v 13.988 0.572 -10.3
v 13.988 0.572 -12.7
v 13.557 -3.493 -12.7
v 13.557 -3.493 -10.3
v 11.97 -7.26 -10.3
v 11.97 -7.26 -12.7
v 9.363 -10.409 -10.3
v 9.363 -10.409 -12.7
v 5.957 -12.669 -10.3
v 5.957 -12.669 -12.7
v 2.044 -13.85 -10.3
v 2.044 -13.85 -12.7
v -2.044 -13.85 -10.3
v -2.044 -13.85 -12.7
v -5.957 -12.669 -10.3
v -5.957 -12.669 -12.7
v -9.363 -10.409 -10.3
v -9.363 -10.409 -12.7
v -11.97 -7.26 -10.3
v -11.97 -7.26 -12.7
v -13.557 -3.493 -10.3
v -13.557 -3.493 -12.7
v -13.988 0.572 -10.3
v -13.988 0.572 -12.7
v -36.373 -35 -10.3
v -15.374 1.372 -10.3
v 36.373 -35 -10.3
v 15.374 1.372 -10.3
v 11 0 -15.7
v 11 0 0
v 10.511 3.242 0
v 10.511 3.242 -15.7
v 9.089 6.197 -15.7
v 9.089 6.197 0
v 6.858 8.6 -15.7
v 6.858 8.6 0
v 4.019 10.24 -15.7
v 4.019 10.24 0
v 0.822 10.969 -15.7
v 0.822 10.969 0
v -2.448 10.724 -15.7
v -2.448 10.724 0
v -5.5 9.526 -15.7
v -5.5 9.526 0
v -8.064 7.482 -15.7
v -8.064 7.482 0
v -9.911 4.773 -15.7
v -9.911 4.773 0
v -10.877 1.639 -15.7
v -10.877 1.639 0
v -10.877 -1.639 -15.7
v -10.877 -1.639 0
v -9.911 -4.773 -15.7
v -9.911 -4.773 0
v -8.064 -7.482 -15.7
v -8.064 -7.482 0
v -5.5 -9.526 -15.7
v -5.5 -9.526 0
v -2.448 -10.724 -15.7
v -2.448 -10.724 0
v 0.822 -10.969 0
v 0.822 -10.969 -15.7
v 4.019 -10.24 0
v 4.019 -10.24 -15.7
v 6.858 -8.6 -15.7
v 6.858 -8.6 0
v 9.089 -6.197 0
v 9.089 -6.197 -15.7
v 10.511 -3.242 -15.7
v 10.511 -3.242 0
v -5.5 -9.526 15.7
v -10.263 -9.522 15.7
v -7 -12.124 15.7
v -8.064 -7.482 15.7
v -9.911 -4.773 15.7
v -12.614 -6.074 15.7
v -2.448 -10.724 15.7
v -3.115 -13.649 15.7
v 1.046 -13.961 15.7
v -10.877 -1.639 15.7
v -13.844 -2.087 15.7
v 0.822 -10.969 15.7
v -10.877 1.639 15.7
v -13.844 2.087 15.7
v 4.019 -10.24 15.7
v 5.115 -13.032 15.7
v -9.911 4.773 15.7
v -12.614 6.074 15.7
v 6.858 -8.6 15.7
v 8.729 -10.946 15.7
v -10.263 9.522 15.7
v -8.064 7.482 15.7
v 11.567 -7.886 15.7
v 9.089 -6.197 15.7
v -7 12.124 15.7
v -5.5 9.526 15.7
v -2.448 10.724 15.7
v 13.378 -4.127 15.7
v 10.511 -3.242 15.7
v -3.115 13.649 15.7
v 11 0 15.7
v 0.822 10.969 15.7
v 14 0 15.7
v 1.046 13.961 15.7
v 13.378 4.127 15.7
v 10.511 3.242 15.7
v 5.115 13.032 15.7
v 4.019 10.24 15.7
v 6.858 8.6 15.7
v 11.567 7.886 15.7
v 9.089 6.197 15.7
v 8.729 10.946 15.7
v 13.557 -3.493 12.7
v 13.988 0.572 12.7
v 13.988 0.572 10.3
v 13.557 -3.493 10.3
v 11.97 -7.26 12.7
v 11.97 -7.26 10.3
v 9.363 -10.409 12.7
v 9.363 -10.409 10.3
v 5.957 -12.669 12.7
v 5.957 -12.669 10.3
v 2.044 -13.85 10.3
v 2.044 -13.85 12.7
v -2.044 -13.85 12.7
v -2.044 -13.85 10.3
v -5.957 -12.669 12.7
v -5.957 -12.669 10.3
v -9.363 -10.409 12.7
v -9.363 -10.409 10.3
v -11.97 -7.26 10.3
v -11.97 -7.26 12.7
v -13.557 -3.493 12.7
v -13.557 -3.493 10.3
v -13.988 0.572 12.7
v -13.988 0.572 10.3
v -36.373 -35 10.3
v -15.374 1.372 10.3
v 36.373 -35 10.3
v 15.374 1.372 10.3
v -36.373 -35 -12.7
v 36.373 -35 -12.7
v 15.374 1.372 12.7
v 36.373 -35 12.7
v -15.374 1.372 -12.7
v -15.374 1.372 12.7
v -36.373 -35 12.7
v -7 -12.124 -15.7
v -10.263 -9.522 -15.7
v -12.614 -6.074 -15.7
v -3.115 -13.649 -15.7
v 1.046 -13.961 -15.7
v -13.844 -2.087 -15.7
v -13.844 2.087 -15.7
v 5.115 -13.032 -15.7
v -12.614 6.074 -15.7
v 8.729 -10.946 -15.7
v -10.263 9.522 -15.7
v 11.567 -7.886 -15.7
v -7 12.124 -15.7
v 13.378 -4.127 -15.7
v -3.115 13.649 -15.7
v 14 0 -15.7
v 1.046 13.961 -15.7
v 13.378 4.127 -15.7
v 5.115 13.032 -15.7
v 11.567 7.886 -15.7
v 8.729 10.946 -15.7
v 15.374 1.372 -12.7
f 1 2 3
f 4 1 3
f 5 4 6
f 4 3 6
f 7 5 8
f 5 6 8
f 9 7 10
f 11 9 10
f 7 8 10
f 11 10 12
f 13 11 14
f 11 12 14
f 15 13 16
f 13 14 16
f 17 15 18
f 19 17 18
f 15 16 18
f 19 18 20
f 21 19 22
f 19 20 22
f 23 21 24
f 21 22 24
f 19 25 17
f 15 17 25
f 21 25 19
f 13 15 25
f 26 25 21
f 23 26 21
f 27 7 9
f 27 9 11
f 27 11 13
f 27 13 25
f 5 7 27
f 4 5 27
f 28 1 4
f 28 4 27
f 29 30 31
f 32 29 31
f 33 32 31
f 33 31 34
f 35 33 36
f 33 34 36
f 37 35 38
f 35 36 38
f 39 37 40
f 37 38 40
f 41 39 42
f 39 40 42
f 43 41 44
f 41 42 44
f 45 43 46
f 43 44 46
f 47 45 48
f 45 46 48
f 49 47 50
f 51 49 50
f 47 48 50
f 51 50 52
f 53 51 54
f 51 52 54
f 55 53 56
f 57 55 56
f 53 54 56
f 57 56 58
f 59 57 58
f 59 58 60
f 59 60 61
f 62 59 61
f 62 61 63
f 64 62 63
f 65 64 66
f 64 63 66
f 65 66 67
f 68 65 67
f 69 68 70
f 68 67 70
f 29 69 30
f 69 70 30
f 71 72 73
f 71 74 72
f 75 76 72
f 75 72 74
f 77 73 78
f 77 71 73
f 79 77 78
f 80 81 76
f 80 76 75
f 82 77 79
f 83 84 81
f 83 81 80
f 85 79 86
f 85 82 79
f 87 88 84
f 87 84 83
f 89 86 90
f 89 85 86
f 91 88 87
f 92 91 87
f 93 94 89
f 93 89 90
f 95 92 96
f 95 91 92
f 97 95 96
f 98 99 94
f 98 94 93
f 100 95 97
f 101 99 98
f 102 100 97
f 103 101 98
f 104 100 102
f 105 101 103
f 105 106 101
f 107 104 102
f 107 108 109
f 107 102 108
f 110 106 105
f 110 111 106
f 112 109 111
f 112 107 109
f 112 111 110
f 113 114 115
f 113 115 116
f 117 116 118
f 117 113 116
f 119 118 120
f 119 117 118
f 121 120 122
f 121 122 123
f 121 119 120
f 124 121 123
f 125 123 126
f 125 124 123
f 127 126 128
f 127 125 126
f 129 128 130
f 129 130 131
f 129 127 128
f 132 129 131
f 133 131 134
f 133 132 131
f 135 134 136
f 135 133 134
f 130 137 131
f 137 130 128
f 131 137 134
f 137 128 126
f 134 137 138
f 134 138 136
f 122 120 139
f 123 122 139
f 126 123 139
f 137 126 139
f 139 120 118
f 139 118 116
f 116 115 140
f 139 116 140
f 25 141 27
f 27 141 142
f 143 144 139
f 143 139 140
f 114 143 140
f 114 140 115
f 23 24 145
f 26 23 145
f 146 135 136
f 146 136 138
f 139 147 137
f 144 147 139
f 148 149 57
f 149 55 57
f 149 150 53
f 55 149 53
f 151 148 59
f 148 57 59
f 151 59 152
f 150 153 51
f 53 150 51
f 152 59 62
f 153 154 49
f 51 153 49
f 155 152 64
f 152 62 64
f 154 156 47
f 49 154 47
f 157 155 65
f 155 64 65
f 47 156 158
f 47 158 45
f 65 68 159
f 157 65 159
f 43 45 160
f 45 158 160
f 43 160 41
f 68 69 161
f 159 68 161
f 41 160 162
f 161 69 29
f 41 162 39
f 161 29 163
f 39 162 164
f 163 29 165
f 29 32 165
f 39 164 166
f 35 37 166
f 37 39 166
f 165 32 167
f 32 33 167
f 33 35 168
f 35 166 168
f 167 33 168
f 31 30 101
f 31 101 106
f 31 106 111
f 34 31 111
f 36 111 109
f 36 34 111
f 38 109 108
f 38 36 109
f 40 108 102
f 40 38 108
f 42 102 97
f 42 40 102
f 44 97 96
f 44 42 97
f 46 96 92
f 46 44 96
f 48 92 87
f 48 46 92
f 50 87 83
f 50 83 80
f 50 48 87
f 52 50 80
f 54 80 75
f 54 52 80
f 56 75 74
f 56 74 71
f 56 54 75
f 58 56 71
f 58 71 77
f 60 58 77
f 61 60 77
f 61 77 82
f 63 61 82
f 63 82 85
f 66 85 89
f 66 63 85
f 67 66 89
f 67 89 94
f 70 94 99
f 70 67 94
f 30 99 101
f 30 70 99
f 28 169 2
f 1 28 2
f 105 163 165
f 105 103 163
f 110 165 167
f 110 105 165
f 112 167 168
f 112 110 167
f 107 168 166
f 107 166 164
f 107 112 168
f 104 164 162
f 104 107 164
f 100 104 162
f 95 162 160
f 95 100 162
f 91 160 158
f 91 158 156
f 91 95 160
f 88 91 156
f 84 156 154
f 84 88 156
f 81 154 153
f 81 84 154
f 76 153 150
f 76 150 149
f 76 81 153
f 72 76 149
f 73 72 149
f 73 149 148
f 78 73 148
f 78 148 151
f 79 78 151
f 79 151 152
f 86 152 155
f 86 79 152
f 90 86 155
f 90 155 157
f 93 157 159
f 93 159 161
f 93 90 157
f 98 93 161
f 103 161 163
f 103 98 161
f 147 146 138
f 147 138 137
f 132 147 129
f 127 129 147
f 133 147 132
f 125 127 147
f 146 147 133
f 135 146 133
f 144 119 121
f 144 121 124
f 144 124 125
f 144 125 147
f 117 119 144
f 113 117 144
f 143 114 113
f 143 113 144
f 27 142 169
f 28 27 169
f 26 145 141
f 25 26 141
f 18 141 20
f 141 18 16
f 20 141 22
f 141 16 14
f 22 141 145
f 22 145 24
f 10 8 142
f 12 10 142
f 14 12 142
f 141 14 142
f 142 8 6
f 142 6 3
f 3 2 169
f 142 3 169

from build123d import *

# Parameters (mm, degrees)
SKETCH1_R                = 14
SKETCH1_R_2              = 11
BOSS_EXTRUDE1_DEPTH      = 15.7
BOSS_EXTRUDE1_DEPTH_BACK = 15.7
BOSS_EXTRUDE3_START      = 12.7
BOSS_EXTRUDE3_DEPTH      = 2.4
BOSS_EXTRUDE4_START      = -12.7
BOSS_EXTRUDE4_DEPTH      = 2.4


with BuildPart() as part:
    # Sketch1 → Boss-Extrude1 (new body, two sides)
    with BuildSketch(Plane.XY) as boss_extrude1_sk:
        Circle(SKETCH1_R)
        Circle(SKETCH1_R_2, mode=Mode.SUBTRACT)
    extrude(amount=BOSS_EXTRUDE1_DEPTH)
    extrude(boss_extrude1_sk.sketch, amount=-BOSS_EXTRUDE1_DEPTH_BACK)


with BuildPart() as body_2:
    # Sketch2 → Boss-Extrude3 (new body)
    with BuildSketch(Plane.XY.offset(BOSS_EXTRUDE3_START)):
        with BuildLine():
            Line((-36.373066959, -35), (36.373066959, -35))
            Line((36.373066959, -35), (15.373971015, 1.371501088))
            Line((15.373971015, 1.371501088), (13.988330369, 0.571501088))
            ThreePointArc((13.988330369, 0.571501088), (0, -14), (-13.988330369, 0.571501088))
            Line((-13.988330369, 0.571501088), (-15.373971015, 1.371501088))
            Line((-15.373971015, 1.371501088), (-36.373066959, -35))
        make_face()
    extrude(amount=-BOSS_EXTRUDE3_DEPTH)


with BuildPart() as body_3:
    # Sketch2_2 → Boss-Extrude4 (new body)
    with BuildSketch(Plane.XY.offset(BOSS_EXTRUDE4_START)):
        with BuildLine():
            Line((-36.373066959, -35), (36.373066959, -35))
            Line((36.373066959, -35), (15.373971015, 1.371501088))
            Line((15.373971015, 1.371501088), (13.988330369, 0.571501088))
            ThreePointArc((13.988330369, 0.571501088), (0, -14), (-13.988330369, 0.571501088))
            Line((-13.988330369, 0.571501088), (-15.373971015, 1.371501088))
            Line((-15.373971015, 1.371501088), (-36.373066959, -35))
        make_face()
    extrude(amount=BOSS_EXTRUDE4_DEPTH)


solid = Compound([part.part, body_2.part, body_3.part])
